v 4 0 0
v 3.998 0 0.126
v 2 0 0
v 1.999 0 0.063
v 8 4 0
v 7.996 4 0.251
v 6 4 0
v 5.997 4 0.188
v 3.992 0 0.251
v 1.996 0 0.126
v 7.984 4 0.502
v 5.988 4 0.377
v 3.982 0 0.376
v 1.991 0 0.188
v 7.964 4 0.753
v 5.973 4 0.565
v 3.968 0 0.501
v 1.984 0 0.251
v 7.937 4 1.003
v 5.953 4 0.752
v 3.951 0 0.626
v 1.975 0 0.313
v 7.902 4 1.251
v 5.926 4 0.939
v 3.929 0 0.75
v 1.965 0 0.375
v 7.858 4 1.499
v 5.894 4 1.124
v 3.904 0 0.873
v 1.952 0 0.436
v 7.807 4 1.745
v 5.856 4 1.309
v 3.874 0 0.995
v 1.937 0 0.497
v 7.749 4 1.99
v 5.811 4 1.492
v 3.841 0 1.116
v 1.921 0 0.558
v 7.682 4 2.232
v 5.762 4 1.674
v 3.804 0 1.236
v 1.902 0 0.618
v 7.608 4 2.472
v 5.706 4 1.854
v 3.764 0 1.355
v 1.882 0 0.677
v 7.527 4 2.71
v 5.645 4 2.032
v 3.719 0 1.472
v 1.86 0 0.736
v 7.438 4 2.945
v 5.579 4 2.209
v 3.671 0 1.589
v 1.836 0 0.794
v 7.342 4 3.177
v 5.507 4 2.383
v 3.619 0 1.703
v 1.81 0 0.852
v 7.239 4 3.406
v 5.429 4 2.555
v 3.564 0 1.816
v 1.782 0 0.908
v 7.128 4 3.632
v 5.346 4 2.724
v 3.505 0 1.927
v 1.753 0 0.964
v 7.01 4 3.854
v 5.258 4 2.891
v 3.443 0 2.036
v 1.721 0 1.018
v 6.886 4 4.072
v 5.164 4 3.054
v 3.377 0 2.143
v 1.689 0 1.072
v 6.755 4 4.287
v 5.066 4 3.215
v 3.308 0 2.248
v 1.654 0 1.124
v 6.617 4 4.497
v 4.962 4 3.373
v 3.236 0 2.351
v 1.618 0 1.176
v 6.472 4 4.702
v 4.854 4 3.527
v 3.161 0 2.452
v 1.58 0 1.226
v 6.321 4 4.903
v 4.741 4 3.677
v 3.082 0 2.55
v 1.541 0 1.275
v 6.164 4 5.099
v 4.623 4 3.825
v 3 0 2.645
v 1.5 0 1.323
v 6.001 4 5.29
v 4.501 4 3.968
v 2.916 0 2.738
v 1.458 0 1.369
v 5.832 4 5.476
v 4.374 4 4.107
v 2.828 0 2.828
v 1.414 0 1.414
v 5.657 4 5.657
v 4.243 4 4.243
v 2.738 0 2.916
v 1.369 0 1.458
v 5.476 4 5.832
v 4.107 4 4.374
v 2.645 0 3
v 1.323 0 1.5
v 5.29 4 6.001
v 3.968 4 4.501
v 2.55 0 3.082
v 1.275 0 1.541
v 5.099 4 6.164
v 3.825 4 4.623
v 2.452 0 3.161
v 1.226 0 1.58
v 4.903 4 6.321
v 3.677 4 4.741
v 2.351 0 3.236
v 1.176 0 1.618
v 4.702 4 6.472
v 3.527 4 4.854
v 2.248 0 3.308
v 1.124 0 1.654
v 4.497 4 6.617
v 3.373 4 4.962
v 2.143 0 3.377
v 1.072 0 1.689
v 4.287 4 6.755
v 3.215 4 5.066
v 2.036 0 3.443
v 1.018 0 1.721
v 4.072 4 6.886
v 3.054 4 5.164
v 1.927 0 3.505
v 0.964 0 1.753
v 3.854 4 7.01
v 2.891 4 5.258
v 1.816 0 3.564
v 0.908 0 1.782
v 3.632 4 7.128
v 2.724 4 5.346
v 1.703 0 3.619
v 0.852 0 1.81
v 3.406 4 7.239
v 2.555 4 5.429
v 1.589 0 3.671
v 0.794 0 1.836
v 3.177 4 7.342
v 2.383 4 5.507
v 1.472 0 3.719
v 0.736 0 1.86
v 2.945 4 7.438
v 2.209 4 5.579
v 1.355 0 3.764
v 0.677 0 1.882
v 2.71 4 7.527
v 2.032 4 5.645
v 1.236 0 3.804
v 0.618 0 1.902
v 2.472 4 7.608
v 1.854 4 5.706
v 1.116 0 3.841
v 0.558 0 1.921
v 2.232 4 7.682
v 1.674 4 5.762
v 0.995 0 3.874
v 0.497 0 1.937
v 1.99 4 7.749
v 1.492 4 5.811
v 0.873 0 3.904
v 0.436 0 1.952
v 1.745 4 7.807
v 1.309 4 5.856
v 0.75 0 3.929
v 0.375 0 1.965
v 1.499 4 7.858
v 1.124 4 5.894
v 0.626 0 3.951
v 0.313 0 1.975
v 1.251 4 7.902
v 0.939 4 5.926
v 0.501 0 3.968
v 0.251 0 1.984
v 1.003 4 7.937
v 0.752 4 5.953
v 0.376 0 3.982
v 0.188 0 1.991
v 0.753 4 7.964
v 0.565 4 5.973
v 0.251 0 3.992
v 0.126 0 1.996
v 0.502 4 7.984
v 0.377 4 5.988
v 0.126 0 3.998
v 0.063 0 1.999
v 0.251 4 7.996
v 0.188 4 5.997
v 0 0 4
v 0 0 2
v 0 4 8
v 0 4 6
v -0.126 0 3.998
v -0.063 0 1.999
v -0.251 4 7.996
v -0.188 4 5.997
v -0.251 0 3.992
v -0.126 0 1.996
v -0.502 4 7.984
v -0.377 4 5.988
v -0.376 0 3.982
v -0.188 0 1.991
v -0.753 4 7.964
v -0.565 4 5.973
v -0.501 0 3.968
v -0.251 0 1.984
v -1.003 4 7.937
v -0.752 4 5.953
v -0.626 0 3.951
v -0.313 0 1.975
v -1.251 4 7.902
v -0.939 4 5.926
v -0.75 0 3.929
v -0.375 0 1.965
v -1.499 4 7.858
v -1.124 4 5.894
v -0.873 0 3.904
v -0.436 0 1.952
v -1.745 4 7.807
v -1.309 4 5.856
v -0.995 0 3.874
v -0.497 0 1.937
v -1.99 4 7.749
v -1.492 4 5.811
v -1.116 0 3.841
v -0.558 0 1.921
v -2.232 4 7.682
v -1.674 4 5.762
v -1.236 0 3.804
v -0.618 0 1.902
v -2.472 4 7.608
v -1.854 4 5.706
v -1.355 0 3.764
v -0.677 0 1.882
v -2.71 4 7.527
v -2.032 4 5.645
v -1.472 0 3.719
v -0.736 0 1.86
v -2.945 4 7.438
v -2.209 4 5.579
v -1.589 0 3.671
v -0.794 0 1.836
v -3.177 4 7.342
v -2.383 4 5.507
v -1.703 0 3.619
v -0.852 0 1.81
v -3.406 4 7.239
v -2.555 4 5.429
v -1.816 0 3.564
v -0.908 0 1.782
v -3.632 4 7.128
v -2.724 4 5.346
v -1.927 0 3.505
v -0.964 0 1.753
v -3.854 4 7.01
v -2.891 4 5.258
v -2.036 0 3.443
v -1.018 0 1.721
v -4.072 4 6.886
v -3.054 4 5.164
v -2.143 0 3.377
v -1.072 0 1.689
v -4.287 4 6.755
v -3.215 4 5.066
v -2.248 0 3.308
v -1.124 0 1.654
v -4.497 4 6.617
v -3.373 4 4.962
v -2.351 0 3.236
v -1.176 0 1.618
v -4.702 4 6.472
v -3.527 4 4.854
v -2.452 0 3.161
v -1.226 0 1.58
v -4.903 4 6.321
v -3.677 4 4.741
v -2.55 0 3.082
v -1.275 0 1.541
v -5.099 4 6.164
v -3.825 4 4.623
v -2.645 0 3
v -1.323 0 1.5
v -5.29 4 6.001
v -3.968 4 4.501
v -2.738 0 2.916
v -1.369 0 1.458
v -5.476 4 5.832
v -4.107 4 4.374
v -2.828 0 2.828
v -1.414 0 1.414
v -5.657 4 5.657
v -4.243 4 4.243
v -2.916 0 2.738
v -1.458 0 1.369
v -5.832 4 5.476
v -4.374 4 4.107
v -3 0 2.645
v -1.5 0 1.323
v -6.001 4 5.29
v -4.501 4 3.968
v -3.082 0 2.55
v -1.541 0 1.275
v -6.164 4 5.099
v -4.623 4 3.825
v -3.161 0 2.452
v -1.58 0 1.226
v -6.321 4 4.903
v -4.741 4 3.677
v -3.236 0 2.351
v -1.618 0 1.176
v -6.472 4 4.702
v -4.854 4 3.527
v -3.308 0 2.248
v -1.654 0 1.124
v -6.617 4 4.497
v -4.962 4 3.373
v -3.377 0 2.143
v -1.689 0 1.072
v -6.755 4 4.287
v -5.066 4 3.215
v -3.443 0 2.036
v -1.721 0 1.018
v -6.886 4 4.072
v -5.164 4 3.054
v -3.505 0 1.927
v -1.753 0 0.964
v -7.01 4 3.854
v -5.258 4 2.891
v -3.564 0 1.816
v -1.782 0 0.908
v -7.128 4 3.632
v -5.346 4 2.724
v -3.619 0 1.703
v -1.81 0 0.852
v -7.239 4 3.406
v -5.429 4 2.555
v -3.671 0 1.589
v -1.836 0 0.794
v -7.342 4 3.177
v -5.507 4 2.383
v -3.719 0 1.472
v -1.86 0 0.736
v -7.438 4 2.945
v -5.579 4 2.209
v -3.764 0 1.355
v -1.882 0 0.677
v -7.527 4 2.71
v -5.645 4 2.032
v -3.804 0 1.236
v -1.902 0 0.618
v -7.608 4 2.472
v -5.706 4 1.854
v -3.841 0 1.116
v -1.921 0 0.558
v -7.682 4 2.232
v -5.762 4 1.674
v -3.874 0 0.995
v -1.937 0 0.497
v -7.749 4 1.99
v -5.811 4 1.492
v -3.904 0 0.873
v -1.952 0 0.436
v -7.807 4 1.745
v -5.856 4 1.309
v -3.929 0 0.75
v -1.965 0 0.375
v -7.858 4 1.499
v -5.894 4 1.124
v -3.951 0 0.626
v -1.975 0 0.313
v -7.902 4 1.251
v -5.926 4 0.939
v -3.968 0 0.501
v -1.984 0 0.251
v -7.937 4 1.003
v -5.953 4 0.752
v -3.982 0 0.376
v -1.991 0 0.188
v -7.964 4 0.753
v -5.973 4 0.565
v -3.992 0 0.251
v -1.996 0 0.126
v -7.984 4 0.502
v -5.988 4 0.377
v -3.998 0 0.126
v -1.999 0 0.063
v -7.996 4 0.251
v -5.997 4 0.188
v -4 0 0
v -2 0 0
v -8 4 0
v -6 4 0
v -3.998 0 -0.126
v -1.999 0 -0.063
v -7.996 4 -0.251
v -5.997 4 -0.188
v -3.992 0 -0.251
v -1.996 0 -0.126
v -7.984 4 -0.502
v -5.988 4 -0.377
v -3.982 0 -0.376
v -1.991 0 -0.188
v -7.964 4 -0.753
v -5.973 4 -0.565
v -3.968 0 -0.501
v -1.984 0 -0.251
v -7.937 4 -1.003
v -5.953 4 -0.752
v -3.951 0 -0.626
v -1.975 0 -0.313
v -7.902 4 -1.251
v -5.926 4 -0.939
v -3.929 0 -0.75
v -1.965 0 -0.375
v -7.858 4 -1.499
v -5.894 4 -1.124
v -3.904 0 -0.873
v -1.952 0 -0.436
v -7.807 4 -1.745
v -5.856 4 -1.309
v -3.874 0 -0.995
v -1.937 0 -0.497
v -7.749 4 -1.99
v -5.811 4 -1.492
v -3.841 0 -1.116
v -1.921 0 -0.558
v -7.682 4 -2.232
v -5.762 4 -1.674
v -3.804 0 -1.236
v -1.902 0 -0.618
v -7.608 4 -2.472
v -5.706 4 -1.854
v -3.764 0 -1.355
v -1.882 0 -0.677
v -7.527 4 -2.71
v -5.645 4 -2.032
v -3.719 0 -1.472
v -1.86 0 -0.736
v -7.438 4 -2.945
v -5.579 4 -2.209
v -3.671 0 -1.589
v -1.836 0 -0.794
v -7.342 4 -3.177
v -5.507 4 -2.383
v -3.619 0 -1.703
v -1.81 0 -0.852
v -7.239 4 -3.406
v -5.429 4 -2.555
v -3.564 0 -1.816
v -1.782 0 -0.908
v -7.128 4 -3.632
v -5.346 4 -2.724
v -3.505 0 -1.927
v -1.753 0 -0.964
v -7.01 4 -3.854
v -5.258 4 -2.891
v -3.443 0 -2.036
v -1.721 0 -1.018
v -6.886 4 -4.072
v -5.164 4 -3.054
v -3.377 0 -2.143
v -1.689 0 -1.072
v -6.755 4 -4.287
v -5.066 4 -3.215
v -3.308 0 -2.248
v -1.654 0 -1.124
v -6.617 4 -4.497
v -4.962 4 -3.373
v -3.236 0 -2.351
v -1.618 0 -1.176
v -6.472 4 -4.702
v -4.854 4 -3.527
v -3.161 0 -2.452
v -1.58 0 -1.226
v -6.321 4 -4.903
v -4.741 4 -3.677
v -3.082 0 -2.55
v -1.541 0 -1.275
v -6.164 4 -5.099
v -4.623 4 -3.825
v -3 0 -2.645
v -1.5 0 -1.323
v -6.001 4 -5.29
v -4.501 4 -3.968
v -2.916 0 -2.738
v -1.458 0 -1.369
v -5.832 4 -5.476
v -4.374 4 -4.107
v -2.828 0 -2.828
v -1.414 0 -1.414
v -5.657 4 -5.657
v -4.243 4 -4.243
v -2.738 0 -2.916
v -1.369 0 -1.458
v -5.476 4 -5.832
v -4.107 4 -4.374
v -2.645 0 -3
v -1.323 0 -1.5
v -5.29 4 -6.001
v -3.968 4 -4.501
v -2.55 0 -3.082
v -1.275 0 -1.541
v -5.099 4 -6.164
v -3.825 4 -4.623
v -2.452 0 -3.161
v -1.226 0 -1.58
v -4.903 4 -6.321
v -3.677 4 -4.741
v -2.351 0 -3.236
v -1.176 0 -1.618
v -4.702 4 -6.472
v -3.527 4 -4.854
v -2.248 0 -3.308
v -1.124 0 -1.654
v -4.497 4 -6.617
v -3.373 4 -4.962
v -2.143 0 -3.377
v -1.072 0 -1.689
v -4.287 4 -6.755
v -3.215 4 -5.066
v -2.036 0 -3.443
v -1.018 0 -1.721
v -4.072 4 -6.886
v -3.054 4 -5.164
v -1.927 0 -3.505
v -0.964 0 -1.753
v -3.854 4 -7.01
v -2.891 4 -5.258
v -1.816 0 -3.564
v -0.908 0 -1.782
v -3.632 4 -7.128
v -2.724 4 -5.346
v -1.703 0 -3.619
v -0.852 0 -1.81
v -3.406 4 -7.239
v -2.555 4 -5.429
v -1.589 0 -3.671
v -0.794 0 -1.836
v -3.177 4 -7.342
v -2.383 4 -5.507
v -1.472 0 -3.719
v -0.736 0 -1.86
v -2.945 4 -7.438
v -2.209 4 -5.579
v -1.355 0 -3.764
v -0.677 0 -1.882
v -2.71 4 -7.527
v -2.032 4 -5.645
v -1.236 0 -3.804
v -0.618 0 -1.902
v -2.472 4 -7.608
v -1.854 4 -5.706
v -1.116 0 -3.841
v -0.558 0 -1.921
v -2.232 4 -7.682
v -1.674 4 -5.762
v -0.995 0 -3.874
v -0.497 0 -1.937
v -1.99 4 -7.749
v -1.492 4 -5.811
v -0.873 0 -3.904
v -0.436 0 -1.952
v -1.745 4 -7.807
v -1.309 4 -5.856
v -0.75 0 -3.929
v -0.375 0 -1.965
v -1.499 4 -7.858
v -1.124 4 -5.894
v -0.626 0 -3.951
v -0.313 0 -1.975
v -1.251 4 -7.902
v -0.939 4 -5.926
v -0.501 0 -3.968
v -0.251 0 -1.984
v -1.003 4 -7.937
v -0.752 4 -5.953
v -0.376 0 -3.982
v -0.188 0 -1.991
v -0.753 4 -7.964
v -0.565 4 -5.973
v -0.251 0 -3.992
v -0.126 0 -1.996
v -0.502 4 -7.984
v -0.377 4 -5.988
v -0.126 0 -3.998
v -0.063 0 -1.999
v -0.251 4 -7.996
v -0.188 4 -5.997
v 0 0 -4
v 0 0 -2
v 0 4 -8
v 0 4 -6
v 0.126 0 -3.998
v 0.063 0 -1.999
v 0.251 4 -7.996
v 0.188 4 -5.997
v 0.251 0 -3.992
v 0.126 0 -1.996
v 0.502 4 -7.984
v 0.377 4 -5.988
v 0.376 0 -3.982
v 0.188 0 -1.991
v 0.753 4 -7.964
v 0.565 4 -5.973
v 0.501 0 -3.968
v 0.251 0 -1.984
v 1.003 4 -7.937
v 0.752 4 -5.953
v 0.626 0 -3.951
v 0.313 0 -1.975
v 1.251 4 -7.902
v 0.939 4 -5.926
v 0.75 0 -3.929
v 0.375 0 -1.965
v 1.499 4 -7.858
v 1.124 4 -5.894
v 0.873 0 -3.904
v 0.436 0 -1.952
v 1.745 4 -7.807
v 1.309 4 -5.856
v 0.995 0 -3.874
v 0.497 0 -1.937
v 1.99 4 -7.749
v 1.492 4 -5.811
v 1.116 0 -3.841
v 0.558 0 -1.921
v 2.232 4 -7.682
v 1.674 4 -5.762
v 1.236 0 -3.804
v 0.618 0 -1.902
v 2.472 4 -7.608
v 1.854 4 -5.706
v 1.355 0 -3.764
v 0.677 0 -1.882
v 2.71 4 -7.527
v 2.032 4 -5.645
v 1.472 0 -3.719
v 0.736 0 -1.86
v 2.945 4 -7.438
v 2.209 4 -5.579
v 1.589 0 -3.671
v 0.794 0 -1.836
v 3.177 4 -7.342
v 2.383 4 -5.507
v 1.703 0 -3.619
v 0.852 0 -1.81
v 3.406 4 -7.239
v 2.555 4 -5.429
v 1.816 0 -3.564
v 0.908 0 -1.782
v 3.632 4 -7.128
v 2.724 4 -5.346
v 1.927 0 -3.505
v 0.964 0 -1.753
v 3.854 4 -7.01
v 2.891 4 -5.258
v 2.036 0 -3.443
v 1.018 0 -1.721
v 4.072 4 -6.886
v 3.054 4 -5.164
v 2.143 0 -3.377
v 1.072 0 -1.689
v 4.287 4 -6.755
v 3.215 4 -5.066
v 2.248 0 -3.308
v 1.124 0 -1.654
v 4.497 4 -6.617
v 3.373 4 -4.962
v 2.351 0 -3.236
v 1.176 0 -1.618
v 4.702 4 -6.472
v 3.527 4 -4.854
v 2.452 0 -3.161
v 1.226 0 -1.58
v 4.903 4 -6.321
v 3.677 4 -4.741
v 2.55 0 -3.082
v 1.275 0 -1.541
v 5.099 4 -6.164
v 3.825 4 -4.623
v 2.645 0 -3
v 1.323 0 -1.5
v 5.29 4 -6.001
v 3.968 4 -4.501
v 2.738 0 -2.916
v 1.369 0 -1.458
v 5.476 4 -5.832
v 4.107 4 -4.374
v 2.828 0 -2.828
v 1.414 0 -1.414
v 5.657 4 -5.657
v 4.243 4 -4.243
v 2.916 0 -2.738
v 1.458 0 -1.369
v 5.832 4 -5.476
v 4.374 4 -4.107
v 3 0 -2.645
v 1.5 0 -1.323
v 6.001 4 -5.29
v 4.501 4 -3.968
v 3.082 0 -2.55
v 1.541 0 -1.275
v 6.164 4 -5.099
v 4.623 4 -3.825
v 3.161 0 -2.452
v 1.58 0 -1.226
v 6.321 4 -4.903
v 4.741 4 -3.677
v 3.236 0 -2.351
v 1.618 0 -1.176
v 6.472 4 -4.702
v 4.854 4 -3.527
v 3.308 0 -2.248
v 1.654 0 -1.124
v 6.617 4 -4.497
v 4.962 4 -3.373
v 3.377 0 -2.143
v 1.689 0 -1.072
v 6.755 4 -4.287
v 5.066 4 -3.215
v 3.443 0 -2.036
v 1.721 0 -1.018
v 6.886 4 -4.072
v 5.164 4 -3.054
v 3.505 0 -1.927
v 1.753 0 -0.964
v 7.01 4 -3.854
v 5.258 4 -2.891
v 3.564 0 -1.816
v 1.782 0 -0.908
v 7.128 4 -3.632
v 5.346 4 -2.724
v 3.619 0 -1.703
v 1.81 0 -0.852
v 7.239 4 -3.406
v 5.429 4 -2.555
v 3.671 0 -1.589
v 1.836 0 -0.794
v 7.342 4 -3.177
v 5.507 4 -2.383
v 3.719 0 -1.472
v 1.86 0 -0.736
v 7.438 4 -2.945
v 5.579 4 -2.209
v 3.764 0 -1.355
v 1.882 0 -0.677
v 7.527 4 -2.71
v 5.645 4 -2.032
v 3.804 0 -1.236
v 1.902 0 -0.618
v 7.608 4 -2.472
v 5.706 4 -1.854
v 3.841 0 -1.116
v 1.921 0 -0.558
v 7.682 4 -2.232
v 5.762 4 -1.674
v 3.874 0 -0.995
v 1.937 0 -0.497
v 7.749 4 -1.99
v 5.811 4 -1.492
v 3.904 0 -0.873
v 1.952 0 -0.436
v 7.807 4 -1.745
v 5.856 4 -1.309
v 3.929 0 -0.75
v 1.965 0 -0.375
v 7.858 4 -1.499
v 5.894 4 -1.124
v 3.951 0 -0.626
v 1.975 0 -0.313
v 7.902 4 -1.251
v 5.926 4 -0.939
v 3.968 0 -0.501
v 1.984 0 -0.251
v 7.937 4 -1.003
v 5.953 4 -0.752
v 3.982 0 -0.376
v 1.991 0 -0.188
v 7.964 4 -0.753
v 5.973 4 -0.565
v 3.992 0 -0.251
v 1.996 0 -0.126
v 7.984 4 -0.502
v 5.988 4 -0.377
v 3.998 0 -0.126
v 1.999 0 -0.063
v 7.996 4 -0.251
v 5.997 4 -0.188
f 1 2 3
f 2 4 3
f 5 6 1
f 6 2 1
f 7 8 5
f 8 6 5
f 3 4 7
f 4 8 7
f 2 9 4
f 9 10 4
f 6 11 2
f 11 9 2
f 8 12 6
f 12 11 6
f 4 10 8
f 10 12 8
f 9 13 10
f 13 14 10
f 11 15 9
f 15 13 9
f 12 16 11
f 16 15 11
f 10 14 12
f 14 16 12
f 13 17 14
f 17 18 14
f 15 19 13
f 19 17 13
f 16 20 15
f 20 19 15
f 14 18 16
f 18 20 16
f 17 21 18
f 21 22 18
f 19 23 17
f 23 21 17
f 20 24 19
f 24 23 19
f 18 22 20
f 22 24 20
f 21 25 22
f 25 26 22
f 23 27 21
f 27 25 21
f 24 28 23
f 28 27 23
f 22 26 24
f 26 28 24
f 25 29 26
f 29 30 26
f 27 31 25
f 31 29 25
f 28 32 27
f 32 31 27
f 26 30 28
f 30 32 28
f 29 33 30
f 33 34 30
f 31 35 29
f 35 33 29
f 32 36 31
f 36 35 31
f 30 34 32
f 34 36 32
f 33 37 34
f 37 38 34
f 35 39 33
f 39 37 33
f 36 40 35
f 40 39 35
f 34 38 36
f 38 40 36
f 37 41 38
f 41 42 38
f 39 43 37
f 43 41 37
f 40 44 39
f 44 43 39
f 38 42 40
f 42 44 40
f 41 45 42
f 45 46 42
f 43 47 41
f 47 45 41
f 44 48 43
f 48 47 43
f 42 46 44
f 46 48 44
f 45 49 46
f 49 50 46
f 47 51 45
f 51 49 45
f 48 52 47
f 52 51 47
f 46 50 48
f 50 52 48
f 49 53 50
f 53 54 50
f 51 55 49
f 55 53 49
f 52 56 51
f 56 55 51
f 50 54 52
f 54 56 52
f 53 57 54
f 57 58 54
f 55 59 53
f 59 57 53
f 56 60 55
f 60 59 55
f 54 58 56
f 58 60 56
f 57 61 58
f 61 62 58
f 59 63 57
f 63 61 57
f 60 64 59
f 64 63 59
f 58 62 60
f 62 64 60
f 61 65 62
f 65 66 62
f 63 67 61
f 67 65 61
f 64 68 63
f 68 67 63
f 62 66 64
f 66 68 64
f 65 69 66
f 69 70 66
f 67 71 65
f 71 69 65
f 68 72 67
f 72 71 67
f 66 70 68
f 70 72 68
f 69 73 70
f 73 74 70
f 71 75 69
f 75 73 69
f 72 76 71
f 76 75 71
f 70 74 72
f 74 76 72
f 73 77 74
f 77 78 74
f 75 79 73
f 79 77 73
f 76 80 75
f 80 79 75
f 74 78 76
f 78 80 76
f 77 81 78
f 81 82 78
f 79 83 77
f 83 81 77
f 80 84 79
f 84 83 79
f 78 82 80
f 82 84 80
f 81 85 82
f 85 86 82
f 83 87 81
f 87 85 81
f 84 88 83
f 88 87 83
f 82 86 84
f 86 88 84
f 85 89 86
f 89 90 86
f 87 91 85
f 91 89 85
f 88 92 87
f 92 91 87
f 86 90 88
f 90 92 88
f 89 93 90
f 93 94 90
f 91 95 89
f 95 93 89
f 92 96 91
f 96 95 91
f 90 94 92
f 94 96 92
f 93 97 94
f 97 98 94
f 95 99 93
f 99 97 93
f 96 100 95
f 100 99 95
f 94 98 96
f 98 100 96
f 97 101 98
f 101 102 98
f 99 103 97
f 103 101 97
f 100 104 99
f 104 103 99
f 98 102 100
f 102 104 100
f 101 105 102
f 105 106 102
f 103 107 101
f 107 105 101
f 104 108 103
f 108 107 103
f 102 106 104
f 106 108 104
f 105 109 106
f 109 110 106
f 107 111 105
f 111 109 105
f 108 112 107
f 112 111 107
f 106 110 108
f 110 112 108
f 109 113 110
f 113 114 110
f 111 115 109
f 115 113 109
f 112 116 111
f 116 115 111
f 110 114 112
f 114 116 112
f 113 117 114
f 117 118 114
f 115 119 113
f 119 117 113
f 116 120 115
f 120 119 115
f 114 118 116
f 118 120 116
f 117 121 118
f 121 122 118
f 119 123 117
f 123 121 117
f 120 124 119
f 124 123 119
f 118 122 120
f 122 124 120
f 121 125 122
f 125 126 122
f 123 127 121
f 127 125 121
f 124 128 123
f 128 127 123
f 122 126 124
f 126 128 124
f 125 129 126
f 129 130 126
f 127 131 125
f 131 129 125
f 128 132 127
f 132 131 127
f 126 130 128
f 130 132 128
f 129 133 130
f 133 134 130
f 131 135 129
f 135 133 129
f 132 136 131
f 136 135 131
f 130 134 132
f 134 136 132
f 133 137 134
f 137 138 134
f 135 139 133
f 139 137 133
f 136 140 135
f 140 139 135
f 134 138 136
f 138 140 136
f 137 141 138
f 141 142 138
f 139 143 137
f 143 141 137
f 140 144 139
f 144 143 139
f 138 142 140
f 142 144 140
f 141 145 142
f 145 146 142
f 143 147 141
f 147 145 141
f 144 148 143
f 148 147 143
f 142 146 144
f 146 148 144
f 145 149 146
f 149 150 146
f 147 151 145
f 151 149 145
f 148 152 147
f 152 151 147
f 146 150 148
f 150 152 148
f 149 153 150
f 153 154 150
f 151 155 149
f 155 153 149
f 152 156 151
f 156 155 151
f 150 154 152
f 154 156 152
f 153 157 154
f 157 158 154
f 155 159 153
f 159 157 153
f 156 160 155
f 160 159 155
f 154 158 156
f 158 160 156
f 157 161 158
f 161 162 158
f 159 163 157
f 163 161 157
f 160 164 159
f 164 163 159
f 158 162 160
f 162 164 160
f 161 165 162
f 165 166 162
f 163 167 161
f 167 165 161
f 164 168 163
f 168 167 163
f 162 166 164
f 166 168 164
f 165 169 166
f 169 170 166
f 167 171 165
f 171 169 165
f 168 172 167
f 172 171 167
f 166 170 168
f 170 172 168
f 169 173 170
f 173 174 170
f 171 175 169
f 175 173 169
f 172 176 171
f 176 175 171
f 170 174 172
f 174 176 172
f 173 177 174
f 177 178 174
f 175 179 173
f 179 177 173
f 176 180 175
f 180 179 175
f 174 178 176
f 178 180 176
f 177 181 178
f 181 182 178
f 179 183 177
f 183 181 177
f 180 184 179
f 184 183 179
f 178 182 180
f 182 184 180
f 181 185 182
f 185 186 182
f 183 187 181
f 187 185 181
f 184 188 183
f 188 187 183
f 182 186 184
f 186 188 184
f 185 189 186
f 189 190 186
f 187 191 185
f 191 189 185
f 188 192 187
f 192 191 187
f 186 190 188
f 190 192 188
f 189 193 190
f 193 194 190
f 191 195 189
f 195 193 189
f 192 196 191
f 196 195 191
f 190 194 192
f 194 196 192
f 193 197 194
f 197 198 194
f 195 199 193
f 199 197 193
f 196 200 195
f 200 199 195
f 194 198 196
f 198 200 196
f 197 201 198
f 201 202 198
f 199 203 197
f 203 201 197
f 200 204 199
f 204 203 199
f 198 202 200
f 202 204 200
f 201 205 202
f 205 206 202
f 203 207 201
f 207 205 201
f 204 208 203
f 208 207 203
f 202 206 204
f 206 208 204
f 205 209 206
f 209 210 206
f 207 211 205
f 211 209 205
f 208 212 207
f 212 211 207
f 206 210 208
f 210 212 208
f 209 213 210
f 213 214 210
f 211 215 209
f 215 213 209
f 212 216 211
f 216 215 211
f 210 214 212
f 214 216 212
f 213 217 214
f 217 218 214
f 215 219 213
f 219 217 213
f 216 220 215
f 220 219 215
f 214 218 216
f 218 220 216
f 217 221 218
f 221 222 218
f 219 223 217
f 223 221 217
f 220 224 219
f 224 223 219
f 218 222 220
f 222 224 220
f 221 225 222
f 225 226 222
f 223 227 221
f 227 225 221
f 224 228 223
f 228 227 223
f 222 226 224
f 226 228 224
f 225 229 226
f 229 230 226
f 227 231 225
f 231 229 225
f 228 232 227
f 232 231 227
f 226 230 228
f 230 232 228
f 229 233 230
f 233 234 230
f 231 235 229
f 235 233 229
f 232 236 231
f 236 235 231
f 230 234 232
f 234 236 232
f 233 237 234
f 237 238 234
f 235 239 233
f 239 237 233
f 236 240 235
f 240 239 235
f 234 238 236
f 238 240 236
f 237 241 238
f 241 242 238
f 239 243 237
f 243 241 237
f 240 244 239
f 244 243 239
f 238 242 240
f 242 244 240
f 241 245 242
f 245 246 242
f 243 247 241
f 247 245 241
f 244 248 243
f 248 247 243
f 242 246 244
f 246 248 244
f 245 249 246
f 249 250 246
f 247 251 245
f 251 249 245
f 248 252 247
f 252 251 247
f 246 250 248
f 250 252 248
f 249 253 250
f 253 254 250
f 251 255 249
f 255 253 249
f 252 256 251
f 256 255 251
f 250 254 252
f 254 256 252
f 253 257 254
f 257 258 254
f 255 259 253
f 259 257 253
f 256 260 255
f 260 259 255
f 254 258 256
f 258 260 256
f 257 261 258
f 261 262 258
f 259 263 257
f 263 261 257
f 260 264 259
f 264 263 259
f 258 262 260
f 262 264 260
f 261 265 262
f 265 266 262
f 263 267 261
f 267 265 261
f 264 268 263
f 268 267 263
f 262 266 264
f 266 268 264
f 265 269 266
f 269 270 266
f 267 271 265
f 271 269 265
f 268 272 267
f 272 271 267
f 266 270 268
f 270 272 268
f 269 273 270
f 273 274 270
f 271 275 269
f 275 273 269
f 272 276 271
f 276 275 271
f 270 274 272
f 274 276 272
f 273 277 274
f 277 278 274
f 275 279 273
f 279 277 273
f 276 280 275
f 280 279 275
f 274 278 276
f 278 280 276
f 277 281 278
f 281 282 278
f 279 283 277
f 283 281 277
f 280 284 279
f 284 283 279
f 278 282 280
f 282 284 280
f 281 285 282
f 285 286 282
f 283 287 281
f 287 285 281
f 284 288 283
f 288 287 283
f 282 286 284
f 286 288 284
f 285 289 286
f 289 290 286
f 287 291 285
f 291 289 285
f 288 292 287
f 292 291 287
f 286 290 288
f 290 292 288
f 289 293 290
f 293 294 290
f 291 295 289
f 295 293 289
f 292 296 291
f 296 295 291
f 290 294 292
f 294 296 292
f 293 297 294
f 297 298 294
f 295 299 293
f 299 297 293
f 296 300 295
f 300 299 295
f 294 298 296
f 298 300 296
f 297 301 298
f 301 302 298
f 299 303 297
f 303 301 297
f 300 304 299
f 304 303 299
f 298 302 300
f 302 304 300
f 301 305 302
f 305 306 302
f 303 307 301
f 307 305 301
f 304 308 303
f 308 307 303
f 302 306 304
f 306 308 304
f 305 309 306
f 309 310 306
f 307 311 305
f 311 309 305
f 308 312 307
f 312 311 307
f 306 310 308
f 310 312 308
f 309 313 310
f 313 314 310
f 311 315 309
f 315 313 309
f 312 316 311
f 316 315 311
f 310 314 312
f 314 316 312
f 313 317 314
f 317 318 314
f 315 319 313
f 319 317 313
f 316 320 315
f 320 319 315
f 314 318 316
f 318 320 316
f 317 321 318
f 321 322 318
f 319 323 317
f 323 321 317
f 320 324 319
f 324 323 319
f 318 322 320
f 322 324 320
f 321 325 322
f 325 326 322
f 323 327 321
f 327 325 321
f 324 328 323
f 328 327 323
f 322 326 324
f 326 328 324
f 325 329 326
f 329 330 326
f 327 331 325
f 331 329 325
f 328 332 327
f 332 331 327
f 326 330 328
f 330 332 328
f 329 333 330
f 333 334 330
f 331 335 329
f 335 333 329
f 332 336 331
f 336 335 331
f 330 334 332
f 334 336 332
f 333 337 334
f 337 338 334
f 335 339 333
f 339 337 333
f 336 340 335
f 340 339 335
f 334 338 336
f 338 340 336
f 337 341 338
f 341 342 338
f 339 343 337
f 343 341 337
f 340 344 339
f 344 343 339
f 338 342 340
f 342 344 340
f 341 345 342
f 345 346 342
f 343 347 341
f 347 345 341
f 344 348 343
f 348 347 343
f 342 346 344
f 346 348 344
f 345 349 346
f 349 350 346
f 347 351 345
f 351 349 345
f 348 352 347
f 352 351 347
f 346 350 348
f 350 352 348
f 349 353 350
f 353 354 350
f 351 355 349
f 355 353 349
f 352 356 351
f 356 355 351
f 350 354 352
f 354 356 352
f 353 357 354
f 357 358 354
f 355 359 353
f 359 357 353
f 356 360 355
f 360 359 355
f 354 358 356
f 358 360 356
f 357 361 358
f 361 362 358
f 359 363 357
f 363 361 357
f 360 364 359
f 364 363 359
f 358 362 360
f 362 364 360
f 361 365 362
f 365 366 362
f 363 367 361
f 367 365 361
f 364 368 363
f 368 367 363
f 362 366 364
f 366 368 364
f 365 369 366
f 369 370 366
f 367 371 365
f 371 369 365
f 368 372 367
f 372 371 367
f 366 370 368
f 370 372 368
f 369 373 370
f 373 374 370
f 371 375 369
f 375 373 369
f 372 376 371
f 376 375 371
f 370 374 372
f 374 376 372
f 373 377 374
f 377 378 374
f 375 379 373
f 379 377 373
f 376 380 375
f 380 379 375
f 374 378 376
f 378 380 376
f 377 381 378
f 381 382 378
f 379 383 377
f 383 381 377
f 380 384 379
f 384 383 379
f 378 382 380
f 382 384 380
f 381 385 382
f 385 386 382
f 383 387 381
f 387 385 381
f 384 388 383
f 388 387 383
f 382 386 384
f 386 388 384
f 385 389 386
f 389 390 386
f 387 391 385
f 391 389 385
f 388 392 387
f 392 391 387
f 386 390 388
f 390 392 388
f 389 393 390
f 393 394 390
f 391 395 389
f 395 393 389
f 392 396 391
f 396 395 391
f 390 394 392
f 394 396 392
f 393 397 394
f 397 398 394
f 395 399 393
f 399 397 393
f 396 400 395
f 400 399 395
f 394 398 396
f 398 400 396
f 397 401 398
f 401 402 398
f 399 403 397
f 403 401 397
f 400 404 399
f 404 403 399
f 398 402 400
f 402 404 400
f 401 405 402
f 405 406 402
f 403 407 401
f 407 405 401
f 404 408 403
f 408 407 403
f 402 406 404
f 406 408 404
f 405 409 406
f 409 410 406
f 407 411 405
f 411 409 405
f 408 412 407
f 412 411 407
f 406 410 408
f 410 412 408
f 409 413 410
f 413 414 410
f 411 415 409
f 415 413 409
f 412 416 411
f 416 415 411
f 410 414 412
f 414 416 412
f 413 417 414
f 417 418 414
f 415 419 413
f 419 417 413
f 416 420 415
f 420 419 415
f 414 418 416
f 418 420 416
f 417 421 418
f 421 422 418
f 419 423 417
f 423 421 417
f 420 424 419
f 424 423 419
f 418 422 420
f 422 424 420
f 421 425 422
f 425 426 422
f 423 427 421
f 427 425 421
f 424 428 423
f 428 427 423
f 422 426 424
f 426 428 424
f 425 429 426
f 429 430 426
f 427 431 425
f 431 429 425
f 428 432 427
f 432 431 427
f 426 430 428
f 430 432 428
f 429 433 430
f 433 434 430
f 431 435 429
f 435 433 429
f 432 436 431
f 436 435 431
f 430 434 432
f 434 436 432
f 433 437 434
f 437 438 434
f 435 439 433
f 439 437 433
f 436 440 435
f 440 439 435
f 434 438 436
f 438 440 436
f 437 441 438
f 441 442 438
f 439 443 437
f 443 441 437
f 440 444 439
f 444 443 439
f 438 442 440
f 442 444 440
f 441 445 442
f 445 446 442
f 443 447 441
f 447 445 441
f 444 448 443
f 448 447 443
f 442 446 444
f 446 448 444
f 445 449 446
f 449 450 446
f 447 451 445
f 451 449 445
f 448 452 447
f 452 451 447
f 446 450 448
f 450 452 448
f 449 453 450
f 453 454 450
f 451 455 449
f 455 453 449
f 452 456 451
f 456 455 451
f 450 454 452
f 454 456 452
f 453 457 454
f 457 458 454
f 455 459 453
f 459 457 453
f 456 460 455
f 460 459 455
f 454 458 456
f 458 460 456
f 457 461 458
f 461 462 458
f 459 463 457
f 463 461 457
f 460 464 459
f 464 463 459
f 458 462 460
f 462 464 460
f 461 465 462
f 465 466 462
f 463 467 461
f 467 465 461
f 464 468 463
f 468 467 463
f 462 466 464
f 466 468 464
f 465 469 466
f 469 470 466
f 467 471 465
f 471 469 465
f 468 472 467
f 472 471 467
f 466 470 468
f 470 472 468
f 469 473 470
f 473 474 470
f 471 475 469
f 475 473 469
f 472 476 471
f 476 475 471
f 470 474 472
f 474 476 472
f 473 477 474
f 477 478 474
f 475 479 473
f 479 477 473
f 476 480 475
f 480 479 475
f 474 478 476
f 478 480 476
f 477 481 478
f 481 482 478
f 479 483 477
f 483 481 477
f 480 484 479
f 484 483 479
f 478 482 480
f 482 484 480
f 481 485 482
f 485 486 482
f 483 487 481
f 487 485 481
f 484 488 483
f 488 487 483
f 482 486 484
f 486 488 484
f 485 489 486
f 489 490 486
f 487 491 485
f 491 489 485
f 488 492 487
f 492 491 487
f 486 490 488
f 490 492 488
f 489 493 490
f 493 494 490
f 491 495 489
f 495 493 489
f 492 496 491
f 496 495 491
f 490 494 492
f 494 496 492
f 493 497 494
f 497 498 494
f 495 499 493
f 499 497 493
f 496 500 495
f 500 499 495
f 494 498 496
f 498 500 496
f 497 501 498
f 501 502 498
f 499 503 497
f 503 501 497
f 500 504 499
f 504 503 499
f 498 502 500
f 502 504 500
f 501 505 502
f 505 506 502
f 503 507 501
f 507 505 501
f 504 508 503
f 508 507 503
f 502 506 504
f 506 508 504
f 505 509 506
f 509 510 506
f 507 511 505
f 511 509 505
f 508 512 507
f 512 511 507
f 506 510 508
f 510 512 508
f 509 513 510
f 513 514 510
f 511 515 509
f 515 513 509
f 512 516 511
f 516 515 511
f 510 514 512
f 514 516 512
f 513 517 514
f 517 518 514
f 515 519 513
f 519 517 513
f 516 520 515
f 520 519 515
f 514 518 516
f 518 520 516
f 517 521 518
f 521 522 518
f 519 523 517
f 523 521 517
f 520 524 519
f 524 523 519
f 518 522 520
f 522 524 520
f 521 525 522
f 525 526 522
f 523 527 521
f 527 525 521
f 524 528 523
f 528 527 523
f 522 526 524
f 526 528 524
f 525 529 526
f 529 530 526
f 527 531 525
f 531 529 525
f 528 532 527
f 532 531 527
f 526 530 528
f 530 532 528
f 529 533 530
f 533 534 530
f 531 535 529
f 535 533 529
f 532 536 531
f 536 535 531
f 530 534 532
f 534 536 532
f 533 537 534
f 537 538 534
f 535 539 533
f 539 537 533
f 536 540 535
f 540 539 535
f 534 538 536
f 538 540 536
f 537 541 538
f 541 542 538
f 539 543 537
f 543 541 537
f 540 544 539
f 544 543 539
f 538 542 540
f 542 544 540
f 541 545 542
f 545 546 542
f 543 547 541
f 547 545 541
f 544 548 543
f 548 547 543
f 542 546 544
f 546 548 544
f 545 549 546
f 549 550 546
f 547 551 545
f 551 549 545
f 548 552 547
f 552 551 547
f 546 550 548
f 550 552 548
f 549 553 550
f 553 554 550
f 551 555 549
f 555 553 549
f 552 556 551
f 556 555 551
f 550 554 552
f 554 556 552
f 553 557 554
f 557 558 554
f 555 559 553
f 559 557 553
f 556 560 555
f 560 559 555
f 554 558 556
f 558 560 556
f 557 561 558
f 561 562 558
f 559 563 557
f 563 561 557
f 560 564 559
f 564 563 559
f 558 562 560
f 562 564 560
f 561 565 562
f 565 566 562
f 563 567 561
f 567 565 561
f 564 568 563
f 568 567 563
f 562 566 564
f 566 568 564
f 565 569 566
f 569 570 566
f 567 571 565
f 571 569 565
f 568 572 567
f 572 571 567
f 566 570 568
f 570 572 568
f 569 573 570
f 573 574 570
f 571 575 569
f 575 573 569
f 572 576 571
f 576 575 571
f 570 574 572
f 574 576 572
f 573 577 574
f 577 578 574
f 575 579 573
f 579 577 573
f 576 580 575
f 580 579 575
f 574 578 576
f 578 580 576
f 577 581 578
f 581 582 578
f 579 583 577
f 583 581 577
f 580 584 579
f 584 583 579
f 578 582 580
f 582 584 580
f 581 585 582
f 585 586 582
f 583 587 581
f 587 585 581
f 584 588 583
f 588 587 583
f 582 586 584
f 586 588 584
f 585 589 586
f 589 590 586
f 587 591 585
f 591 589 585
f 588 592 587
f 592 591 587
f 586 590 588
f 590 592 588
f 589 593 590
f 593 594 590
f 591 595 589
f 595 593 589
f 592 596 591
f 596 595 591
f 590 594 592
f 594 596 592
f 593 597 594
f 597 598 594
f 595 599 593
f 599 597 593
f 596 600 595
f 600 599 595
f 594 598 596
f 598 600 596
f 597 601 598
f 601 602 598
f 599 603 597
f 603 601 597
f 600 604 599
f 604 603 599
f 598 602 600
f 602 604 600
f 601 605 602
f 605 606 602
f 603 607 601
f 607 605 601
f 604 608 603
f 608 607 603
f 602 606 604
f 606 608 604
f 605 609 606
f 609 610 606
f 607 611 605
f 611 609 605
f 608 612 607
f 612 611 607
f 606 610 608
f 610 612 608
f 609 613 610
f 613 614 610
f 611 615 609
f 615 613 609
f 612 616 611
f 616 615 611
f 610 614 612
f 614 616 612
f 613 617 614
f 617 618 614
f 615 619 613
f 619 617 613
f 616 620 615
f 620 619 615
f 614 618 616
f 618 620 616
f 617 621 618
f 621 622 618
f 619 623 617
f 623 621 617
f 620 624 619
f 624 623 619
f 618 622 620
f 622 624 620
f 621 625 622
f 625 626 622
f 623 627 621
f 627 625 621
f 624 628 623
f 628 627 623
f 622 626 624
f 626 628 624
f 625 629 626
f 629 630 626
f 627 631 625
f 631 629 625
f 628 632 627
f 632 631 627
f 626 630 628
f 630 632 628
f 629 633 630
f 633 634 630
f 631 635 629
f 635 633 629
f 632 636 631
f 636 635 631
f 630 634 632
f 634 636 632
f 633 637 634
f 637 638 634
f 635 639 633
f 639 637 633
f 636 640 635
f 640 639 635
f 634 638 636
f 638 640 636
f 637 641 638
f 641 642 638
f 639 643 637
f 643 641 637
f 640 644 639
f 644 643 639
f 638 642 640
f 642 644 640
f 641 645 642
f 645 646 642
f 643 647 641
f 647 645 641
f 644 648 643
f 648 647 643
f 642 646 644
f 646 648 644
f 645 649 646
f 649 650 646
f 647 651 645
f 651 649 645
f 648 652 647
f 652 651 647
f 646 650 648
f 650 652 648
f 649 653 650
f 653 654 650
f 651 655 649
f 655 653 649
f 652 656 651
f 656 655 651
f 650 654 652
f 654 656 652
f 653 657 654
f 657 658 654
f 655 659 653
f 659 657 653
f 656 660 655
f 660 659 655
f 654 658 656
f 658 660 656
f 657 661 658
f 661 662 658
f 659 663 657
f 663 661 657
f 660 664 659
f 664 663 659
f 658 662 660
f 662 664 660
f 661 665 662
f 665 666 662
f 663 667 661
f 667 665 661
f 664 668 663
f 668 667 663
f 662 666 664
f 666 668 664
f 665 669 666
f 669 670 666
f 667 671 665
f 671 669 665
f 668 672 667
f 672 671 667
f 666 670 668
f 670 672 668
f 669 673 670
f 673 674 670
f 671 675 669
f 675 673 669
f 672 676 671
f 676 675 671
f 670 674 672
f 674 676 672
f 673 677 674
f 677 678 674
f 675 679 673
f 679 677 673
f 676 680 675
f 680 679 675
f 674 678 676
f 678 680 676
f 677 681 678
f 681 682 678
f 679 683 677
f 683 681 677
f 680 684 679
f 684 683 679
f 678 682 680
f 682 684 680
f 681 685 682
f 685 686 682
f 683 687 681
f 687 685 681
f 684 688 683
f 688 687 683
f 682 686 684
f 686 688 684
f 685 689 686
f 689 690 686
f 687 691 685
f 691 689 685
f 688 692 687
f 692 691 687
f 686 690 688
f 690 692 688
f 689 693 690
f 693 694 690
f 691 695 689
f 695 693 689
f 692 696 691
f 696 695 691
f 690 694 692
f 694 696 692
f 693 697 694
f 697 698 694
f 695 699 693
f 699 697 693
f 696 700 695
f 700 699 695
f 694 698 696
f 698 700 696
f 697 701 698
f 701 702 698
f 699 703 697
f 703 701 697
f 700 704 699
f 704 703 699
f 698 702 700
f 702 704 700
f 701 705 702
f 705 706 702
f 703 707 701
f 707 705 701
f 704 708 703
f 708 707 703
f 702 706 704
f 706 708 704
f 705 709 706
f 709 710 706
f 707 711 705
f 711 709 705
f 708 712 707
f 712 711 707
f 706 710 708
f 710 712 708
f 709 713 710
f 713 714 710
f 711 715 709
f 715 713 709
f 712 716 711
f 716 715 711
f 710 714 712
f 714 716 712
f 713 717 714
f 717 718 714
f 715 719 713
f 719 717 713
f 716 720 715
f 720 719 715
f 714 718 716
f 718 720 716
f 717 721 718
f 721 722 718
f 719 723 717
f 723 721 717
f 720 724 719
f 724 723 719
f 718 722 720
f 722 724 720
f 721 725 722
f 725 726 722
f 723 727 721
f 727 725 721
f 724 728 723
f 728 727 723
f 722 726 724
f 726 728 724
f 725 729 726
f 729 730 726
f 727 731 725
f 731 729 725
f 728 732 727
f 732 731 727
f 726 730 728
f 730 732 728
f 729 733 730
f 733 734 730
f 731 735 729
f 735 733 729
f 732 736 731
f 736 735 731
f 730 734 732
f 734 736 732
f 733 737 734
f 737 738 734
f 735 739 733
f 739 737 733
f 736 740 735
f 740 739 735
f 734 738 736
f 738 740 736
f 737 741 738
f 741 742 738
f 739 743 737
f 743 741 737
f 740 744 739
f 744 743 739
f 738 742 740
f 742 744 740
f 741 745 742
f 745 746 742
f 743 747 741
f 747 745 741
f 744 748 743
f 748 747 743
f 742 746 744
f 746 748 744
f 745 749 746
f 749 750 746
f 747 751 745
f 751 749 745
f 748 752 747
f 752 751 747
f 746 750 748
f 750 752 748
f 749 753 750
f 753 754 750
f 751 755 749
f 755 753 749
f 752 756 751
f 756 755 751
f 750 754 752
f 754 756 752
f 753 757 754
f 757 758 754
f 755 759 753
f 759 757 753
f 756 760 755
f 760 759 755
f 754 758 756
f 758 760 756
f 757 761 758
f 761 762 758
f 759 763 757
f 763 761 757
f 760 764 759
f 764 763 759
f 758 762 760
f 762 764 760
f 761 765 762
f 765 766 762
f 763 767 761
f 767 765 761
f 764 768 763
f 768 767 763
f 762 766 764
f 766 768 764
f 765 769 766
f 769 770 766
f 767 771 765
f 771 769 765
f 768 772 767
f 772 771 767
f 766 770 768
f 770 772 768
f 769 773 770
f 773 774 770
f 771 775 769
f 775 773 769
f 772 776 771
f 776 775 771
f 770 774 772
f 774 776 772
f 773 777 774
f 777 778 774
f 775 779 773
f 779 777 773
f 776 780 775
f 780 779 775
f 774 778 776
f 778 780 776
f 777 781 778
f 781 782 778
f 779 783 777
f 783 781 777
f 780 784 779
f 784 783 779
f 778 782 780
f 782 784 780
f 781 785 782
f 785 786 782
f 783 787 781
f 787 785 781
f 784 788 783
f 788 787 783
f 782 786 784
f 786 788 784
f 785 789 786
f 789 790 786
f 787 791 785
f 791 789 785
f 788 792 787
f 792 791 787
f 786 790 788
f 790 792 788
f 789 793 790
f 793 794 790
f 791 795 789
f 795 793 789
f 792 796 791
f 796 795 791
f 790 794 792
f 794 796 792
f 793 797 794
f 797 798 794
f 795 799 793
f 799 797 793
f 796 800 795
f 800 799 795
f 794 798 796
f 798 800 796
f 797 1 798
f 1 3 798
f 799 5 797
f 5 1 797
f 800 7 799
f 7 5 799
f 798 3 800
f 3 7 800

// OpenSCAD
//x1, y1 and x2,y2 form the value pairs at the beggining and end of the graph/region

x1 = 0;
x2 = 4;

y1 = 1;
y2 = 1;

step = 0.05;

function f(x) = x +2;

function g(x) = x + 4;

generated_points = [ for (a = [x1 : step : x2]) [ a, f(a)], 
    for (b = [x2 : -step : x1]) [ b, g(b)] /*, [x2, g(x2)], [x1, g(x1)]*/ ];
    
//polygon(generated_points);
echo(generated_points);
// uncomment line below to view the functions graph
// rotate([0,0,90]) polygon( points=generated_points )

// Positions the solid so that it is centered around the x-axis, comment the below line out to revolve around the y-axis.
rotate([-90,0,0])

rotate_extrude($fn=200) 
// The a 90 degree rotation around the z-axis lets this generate a revolved solid with equivalent to a revolve around the x-axis. Comment the below line out to revolve around the y-axis.
rotate([0,0,90]) 
polygon( points=generated_points );
